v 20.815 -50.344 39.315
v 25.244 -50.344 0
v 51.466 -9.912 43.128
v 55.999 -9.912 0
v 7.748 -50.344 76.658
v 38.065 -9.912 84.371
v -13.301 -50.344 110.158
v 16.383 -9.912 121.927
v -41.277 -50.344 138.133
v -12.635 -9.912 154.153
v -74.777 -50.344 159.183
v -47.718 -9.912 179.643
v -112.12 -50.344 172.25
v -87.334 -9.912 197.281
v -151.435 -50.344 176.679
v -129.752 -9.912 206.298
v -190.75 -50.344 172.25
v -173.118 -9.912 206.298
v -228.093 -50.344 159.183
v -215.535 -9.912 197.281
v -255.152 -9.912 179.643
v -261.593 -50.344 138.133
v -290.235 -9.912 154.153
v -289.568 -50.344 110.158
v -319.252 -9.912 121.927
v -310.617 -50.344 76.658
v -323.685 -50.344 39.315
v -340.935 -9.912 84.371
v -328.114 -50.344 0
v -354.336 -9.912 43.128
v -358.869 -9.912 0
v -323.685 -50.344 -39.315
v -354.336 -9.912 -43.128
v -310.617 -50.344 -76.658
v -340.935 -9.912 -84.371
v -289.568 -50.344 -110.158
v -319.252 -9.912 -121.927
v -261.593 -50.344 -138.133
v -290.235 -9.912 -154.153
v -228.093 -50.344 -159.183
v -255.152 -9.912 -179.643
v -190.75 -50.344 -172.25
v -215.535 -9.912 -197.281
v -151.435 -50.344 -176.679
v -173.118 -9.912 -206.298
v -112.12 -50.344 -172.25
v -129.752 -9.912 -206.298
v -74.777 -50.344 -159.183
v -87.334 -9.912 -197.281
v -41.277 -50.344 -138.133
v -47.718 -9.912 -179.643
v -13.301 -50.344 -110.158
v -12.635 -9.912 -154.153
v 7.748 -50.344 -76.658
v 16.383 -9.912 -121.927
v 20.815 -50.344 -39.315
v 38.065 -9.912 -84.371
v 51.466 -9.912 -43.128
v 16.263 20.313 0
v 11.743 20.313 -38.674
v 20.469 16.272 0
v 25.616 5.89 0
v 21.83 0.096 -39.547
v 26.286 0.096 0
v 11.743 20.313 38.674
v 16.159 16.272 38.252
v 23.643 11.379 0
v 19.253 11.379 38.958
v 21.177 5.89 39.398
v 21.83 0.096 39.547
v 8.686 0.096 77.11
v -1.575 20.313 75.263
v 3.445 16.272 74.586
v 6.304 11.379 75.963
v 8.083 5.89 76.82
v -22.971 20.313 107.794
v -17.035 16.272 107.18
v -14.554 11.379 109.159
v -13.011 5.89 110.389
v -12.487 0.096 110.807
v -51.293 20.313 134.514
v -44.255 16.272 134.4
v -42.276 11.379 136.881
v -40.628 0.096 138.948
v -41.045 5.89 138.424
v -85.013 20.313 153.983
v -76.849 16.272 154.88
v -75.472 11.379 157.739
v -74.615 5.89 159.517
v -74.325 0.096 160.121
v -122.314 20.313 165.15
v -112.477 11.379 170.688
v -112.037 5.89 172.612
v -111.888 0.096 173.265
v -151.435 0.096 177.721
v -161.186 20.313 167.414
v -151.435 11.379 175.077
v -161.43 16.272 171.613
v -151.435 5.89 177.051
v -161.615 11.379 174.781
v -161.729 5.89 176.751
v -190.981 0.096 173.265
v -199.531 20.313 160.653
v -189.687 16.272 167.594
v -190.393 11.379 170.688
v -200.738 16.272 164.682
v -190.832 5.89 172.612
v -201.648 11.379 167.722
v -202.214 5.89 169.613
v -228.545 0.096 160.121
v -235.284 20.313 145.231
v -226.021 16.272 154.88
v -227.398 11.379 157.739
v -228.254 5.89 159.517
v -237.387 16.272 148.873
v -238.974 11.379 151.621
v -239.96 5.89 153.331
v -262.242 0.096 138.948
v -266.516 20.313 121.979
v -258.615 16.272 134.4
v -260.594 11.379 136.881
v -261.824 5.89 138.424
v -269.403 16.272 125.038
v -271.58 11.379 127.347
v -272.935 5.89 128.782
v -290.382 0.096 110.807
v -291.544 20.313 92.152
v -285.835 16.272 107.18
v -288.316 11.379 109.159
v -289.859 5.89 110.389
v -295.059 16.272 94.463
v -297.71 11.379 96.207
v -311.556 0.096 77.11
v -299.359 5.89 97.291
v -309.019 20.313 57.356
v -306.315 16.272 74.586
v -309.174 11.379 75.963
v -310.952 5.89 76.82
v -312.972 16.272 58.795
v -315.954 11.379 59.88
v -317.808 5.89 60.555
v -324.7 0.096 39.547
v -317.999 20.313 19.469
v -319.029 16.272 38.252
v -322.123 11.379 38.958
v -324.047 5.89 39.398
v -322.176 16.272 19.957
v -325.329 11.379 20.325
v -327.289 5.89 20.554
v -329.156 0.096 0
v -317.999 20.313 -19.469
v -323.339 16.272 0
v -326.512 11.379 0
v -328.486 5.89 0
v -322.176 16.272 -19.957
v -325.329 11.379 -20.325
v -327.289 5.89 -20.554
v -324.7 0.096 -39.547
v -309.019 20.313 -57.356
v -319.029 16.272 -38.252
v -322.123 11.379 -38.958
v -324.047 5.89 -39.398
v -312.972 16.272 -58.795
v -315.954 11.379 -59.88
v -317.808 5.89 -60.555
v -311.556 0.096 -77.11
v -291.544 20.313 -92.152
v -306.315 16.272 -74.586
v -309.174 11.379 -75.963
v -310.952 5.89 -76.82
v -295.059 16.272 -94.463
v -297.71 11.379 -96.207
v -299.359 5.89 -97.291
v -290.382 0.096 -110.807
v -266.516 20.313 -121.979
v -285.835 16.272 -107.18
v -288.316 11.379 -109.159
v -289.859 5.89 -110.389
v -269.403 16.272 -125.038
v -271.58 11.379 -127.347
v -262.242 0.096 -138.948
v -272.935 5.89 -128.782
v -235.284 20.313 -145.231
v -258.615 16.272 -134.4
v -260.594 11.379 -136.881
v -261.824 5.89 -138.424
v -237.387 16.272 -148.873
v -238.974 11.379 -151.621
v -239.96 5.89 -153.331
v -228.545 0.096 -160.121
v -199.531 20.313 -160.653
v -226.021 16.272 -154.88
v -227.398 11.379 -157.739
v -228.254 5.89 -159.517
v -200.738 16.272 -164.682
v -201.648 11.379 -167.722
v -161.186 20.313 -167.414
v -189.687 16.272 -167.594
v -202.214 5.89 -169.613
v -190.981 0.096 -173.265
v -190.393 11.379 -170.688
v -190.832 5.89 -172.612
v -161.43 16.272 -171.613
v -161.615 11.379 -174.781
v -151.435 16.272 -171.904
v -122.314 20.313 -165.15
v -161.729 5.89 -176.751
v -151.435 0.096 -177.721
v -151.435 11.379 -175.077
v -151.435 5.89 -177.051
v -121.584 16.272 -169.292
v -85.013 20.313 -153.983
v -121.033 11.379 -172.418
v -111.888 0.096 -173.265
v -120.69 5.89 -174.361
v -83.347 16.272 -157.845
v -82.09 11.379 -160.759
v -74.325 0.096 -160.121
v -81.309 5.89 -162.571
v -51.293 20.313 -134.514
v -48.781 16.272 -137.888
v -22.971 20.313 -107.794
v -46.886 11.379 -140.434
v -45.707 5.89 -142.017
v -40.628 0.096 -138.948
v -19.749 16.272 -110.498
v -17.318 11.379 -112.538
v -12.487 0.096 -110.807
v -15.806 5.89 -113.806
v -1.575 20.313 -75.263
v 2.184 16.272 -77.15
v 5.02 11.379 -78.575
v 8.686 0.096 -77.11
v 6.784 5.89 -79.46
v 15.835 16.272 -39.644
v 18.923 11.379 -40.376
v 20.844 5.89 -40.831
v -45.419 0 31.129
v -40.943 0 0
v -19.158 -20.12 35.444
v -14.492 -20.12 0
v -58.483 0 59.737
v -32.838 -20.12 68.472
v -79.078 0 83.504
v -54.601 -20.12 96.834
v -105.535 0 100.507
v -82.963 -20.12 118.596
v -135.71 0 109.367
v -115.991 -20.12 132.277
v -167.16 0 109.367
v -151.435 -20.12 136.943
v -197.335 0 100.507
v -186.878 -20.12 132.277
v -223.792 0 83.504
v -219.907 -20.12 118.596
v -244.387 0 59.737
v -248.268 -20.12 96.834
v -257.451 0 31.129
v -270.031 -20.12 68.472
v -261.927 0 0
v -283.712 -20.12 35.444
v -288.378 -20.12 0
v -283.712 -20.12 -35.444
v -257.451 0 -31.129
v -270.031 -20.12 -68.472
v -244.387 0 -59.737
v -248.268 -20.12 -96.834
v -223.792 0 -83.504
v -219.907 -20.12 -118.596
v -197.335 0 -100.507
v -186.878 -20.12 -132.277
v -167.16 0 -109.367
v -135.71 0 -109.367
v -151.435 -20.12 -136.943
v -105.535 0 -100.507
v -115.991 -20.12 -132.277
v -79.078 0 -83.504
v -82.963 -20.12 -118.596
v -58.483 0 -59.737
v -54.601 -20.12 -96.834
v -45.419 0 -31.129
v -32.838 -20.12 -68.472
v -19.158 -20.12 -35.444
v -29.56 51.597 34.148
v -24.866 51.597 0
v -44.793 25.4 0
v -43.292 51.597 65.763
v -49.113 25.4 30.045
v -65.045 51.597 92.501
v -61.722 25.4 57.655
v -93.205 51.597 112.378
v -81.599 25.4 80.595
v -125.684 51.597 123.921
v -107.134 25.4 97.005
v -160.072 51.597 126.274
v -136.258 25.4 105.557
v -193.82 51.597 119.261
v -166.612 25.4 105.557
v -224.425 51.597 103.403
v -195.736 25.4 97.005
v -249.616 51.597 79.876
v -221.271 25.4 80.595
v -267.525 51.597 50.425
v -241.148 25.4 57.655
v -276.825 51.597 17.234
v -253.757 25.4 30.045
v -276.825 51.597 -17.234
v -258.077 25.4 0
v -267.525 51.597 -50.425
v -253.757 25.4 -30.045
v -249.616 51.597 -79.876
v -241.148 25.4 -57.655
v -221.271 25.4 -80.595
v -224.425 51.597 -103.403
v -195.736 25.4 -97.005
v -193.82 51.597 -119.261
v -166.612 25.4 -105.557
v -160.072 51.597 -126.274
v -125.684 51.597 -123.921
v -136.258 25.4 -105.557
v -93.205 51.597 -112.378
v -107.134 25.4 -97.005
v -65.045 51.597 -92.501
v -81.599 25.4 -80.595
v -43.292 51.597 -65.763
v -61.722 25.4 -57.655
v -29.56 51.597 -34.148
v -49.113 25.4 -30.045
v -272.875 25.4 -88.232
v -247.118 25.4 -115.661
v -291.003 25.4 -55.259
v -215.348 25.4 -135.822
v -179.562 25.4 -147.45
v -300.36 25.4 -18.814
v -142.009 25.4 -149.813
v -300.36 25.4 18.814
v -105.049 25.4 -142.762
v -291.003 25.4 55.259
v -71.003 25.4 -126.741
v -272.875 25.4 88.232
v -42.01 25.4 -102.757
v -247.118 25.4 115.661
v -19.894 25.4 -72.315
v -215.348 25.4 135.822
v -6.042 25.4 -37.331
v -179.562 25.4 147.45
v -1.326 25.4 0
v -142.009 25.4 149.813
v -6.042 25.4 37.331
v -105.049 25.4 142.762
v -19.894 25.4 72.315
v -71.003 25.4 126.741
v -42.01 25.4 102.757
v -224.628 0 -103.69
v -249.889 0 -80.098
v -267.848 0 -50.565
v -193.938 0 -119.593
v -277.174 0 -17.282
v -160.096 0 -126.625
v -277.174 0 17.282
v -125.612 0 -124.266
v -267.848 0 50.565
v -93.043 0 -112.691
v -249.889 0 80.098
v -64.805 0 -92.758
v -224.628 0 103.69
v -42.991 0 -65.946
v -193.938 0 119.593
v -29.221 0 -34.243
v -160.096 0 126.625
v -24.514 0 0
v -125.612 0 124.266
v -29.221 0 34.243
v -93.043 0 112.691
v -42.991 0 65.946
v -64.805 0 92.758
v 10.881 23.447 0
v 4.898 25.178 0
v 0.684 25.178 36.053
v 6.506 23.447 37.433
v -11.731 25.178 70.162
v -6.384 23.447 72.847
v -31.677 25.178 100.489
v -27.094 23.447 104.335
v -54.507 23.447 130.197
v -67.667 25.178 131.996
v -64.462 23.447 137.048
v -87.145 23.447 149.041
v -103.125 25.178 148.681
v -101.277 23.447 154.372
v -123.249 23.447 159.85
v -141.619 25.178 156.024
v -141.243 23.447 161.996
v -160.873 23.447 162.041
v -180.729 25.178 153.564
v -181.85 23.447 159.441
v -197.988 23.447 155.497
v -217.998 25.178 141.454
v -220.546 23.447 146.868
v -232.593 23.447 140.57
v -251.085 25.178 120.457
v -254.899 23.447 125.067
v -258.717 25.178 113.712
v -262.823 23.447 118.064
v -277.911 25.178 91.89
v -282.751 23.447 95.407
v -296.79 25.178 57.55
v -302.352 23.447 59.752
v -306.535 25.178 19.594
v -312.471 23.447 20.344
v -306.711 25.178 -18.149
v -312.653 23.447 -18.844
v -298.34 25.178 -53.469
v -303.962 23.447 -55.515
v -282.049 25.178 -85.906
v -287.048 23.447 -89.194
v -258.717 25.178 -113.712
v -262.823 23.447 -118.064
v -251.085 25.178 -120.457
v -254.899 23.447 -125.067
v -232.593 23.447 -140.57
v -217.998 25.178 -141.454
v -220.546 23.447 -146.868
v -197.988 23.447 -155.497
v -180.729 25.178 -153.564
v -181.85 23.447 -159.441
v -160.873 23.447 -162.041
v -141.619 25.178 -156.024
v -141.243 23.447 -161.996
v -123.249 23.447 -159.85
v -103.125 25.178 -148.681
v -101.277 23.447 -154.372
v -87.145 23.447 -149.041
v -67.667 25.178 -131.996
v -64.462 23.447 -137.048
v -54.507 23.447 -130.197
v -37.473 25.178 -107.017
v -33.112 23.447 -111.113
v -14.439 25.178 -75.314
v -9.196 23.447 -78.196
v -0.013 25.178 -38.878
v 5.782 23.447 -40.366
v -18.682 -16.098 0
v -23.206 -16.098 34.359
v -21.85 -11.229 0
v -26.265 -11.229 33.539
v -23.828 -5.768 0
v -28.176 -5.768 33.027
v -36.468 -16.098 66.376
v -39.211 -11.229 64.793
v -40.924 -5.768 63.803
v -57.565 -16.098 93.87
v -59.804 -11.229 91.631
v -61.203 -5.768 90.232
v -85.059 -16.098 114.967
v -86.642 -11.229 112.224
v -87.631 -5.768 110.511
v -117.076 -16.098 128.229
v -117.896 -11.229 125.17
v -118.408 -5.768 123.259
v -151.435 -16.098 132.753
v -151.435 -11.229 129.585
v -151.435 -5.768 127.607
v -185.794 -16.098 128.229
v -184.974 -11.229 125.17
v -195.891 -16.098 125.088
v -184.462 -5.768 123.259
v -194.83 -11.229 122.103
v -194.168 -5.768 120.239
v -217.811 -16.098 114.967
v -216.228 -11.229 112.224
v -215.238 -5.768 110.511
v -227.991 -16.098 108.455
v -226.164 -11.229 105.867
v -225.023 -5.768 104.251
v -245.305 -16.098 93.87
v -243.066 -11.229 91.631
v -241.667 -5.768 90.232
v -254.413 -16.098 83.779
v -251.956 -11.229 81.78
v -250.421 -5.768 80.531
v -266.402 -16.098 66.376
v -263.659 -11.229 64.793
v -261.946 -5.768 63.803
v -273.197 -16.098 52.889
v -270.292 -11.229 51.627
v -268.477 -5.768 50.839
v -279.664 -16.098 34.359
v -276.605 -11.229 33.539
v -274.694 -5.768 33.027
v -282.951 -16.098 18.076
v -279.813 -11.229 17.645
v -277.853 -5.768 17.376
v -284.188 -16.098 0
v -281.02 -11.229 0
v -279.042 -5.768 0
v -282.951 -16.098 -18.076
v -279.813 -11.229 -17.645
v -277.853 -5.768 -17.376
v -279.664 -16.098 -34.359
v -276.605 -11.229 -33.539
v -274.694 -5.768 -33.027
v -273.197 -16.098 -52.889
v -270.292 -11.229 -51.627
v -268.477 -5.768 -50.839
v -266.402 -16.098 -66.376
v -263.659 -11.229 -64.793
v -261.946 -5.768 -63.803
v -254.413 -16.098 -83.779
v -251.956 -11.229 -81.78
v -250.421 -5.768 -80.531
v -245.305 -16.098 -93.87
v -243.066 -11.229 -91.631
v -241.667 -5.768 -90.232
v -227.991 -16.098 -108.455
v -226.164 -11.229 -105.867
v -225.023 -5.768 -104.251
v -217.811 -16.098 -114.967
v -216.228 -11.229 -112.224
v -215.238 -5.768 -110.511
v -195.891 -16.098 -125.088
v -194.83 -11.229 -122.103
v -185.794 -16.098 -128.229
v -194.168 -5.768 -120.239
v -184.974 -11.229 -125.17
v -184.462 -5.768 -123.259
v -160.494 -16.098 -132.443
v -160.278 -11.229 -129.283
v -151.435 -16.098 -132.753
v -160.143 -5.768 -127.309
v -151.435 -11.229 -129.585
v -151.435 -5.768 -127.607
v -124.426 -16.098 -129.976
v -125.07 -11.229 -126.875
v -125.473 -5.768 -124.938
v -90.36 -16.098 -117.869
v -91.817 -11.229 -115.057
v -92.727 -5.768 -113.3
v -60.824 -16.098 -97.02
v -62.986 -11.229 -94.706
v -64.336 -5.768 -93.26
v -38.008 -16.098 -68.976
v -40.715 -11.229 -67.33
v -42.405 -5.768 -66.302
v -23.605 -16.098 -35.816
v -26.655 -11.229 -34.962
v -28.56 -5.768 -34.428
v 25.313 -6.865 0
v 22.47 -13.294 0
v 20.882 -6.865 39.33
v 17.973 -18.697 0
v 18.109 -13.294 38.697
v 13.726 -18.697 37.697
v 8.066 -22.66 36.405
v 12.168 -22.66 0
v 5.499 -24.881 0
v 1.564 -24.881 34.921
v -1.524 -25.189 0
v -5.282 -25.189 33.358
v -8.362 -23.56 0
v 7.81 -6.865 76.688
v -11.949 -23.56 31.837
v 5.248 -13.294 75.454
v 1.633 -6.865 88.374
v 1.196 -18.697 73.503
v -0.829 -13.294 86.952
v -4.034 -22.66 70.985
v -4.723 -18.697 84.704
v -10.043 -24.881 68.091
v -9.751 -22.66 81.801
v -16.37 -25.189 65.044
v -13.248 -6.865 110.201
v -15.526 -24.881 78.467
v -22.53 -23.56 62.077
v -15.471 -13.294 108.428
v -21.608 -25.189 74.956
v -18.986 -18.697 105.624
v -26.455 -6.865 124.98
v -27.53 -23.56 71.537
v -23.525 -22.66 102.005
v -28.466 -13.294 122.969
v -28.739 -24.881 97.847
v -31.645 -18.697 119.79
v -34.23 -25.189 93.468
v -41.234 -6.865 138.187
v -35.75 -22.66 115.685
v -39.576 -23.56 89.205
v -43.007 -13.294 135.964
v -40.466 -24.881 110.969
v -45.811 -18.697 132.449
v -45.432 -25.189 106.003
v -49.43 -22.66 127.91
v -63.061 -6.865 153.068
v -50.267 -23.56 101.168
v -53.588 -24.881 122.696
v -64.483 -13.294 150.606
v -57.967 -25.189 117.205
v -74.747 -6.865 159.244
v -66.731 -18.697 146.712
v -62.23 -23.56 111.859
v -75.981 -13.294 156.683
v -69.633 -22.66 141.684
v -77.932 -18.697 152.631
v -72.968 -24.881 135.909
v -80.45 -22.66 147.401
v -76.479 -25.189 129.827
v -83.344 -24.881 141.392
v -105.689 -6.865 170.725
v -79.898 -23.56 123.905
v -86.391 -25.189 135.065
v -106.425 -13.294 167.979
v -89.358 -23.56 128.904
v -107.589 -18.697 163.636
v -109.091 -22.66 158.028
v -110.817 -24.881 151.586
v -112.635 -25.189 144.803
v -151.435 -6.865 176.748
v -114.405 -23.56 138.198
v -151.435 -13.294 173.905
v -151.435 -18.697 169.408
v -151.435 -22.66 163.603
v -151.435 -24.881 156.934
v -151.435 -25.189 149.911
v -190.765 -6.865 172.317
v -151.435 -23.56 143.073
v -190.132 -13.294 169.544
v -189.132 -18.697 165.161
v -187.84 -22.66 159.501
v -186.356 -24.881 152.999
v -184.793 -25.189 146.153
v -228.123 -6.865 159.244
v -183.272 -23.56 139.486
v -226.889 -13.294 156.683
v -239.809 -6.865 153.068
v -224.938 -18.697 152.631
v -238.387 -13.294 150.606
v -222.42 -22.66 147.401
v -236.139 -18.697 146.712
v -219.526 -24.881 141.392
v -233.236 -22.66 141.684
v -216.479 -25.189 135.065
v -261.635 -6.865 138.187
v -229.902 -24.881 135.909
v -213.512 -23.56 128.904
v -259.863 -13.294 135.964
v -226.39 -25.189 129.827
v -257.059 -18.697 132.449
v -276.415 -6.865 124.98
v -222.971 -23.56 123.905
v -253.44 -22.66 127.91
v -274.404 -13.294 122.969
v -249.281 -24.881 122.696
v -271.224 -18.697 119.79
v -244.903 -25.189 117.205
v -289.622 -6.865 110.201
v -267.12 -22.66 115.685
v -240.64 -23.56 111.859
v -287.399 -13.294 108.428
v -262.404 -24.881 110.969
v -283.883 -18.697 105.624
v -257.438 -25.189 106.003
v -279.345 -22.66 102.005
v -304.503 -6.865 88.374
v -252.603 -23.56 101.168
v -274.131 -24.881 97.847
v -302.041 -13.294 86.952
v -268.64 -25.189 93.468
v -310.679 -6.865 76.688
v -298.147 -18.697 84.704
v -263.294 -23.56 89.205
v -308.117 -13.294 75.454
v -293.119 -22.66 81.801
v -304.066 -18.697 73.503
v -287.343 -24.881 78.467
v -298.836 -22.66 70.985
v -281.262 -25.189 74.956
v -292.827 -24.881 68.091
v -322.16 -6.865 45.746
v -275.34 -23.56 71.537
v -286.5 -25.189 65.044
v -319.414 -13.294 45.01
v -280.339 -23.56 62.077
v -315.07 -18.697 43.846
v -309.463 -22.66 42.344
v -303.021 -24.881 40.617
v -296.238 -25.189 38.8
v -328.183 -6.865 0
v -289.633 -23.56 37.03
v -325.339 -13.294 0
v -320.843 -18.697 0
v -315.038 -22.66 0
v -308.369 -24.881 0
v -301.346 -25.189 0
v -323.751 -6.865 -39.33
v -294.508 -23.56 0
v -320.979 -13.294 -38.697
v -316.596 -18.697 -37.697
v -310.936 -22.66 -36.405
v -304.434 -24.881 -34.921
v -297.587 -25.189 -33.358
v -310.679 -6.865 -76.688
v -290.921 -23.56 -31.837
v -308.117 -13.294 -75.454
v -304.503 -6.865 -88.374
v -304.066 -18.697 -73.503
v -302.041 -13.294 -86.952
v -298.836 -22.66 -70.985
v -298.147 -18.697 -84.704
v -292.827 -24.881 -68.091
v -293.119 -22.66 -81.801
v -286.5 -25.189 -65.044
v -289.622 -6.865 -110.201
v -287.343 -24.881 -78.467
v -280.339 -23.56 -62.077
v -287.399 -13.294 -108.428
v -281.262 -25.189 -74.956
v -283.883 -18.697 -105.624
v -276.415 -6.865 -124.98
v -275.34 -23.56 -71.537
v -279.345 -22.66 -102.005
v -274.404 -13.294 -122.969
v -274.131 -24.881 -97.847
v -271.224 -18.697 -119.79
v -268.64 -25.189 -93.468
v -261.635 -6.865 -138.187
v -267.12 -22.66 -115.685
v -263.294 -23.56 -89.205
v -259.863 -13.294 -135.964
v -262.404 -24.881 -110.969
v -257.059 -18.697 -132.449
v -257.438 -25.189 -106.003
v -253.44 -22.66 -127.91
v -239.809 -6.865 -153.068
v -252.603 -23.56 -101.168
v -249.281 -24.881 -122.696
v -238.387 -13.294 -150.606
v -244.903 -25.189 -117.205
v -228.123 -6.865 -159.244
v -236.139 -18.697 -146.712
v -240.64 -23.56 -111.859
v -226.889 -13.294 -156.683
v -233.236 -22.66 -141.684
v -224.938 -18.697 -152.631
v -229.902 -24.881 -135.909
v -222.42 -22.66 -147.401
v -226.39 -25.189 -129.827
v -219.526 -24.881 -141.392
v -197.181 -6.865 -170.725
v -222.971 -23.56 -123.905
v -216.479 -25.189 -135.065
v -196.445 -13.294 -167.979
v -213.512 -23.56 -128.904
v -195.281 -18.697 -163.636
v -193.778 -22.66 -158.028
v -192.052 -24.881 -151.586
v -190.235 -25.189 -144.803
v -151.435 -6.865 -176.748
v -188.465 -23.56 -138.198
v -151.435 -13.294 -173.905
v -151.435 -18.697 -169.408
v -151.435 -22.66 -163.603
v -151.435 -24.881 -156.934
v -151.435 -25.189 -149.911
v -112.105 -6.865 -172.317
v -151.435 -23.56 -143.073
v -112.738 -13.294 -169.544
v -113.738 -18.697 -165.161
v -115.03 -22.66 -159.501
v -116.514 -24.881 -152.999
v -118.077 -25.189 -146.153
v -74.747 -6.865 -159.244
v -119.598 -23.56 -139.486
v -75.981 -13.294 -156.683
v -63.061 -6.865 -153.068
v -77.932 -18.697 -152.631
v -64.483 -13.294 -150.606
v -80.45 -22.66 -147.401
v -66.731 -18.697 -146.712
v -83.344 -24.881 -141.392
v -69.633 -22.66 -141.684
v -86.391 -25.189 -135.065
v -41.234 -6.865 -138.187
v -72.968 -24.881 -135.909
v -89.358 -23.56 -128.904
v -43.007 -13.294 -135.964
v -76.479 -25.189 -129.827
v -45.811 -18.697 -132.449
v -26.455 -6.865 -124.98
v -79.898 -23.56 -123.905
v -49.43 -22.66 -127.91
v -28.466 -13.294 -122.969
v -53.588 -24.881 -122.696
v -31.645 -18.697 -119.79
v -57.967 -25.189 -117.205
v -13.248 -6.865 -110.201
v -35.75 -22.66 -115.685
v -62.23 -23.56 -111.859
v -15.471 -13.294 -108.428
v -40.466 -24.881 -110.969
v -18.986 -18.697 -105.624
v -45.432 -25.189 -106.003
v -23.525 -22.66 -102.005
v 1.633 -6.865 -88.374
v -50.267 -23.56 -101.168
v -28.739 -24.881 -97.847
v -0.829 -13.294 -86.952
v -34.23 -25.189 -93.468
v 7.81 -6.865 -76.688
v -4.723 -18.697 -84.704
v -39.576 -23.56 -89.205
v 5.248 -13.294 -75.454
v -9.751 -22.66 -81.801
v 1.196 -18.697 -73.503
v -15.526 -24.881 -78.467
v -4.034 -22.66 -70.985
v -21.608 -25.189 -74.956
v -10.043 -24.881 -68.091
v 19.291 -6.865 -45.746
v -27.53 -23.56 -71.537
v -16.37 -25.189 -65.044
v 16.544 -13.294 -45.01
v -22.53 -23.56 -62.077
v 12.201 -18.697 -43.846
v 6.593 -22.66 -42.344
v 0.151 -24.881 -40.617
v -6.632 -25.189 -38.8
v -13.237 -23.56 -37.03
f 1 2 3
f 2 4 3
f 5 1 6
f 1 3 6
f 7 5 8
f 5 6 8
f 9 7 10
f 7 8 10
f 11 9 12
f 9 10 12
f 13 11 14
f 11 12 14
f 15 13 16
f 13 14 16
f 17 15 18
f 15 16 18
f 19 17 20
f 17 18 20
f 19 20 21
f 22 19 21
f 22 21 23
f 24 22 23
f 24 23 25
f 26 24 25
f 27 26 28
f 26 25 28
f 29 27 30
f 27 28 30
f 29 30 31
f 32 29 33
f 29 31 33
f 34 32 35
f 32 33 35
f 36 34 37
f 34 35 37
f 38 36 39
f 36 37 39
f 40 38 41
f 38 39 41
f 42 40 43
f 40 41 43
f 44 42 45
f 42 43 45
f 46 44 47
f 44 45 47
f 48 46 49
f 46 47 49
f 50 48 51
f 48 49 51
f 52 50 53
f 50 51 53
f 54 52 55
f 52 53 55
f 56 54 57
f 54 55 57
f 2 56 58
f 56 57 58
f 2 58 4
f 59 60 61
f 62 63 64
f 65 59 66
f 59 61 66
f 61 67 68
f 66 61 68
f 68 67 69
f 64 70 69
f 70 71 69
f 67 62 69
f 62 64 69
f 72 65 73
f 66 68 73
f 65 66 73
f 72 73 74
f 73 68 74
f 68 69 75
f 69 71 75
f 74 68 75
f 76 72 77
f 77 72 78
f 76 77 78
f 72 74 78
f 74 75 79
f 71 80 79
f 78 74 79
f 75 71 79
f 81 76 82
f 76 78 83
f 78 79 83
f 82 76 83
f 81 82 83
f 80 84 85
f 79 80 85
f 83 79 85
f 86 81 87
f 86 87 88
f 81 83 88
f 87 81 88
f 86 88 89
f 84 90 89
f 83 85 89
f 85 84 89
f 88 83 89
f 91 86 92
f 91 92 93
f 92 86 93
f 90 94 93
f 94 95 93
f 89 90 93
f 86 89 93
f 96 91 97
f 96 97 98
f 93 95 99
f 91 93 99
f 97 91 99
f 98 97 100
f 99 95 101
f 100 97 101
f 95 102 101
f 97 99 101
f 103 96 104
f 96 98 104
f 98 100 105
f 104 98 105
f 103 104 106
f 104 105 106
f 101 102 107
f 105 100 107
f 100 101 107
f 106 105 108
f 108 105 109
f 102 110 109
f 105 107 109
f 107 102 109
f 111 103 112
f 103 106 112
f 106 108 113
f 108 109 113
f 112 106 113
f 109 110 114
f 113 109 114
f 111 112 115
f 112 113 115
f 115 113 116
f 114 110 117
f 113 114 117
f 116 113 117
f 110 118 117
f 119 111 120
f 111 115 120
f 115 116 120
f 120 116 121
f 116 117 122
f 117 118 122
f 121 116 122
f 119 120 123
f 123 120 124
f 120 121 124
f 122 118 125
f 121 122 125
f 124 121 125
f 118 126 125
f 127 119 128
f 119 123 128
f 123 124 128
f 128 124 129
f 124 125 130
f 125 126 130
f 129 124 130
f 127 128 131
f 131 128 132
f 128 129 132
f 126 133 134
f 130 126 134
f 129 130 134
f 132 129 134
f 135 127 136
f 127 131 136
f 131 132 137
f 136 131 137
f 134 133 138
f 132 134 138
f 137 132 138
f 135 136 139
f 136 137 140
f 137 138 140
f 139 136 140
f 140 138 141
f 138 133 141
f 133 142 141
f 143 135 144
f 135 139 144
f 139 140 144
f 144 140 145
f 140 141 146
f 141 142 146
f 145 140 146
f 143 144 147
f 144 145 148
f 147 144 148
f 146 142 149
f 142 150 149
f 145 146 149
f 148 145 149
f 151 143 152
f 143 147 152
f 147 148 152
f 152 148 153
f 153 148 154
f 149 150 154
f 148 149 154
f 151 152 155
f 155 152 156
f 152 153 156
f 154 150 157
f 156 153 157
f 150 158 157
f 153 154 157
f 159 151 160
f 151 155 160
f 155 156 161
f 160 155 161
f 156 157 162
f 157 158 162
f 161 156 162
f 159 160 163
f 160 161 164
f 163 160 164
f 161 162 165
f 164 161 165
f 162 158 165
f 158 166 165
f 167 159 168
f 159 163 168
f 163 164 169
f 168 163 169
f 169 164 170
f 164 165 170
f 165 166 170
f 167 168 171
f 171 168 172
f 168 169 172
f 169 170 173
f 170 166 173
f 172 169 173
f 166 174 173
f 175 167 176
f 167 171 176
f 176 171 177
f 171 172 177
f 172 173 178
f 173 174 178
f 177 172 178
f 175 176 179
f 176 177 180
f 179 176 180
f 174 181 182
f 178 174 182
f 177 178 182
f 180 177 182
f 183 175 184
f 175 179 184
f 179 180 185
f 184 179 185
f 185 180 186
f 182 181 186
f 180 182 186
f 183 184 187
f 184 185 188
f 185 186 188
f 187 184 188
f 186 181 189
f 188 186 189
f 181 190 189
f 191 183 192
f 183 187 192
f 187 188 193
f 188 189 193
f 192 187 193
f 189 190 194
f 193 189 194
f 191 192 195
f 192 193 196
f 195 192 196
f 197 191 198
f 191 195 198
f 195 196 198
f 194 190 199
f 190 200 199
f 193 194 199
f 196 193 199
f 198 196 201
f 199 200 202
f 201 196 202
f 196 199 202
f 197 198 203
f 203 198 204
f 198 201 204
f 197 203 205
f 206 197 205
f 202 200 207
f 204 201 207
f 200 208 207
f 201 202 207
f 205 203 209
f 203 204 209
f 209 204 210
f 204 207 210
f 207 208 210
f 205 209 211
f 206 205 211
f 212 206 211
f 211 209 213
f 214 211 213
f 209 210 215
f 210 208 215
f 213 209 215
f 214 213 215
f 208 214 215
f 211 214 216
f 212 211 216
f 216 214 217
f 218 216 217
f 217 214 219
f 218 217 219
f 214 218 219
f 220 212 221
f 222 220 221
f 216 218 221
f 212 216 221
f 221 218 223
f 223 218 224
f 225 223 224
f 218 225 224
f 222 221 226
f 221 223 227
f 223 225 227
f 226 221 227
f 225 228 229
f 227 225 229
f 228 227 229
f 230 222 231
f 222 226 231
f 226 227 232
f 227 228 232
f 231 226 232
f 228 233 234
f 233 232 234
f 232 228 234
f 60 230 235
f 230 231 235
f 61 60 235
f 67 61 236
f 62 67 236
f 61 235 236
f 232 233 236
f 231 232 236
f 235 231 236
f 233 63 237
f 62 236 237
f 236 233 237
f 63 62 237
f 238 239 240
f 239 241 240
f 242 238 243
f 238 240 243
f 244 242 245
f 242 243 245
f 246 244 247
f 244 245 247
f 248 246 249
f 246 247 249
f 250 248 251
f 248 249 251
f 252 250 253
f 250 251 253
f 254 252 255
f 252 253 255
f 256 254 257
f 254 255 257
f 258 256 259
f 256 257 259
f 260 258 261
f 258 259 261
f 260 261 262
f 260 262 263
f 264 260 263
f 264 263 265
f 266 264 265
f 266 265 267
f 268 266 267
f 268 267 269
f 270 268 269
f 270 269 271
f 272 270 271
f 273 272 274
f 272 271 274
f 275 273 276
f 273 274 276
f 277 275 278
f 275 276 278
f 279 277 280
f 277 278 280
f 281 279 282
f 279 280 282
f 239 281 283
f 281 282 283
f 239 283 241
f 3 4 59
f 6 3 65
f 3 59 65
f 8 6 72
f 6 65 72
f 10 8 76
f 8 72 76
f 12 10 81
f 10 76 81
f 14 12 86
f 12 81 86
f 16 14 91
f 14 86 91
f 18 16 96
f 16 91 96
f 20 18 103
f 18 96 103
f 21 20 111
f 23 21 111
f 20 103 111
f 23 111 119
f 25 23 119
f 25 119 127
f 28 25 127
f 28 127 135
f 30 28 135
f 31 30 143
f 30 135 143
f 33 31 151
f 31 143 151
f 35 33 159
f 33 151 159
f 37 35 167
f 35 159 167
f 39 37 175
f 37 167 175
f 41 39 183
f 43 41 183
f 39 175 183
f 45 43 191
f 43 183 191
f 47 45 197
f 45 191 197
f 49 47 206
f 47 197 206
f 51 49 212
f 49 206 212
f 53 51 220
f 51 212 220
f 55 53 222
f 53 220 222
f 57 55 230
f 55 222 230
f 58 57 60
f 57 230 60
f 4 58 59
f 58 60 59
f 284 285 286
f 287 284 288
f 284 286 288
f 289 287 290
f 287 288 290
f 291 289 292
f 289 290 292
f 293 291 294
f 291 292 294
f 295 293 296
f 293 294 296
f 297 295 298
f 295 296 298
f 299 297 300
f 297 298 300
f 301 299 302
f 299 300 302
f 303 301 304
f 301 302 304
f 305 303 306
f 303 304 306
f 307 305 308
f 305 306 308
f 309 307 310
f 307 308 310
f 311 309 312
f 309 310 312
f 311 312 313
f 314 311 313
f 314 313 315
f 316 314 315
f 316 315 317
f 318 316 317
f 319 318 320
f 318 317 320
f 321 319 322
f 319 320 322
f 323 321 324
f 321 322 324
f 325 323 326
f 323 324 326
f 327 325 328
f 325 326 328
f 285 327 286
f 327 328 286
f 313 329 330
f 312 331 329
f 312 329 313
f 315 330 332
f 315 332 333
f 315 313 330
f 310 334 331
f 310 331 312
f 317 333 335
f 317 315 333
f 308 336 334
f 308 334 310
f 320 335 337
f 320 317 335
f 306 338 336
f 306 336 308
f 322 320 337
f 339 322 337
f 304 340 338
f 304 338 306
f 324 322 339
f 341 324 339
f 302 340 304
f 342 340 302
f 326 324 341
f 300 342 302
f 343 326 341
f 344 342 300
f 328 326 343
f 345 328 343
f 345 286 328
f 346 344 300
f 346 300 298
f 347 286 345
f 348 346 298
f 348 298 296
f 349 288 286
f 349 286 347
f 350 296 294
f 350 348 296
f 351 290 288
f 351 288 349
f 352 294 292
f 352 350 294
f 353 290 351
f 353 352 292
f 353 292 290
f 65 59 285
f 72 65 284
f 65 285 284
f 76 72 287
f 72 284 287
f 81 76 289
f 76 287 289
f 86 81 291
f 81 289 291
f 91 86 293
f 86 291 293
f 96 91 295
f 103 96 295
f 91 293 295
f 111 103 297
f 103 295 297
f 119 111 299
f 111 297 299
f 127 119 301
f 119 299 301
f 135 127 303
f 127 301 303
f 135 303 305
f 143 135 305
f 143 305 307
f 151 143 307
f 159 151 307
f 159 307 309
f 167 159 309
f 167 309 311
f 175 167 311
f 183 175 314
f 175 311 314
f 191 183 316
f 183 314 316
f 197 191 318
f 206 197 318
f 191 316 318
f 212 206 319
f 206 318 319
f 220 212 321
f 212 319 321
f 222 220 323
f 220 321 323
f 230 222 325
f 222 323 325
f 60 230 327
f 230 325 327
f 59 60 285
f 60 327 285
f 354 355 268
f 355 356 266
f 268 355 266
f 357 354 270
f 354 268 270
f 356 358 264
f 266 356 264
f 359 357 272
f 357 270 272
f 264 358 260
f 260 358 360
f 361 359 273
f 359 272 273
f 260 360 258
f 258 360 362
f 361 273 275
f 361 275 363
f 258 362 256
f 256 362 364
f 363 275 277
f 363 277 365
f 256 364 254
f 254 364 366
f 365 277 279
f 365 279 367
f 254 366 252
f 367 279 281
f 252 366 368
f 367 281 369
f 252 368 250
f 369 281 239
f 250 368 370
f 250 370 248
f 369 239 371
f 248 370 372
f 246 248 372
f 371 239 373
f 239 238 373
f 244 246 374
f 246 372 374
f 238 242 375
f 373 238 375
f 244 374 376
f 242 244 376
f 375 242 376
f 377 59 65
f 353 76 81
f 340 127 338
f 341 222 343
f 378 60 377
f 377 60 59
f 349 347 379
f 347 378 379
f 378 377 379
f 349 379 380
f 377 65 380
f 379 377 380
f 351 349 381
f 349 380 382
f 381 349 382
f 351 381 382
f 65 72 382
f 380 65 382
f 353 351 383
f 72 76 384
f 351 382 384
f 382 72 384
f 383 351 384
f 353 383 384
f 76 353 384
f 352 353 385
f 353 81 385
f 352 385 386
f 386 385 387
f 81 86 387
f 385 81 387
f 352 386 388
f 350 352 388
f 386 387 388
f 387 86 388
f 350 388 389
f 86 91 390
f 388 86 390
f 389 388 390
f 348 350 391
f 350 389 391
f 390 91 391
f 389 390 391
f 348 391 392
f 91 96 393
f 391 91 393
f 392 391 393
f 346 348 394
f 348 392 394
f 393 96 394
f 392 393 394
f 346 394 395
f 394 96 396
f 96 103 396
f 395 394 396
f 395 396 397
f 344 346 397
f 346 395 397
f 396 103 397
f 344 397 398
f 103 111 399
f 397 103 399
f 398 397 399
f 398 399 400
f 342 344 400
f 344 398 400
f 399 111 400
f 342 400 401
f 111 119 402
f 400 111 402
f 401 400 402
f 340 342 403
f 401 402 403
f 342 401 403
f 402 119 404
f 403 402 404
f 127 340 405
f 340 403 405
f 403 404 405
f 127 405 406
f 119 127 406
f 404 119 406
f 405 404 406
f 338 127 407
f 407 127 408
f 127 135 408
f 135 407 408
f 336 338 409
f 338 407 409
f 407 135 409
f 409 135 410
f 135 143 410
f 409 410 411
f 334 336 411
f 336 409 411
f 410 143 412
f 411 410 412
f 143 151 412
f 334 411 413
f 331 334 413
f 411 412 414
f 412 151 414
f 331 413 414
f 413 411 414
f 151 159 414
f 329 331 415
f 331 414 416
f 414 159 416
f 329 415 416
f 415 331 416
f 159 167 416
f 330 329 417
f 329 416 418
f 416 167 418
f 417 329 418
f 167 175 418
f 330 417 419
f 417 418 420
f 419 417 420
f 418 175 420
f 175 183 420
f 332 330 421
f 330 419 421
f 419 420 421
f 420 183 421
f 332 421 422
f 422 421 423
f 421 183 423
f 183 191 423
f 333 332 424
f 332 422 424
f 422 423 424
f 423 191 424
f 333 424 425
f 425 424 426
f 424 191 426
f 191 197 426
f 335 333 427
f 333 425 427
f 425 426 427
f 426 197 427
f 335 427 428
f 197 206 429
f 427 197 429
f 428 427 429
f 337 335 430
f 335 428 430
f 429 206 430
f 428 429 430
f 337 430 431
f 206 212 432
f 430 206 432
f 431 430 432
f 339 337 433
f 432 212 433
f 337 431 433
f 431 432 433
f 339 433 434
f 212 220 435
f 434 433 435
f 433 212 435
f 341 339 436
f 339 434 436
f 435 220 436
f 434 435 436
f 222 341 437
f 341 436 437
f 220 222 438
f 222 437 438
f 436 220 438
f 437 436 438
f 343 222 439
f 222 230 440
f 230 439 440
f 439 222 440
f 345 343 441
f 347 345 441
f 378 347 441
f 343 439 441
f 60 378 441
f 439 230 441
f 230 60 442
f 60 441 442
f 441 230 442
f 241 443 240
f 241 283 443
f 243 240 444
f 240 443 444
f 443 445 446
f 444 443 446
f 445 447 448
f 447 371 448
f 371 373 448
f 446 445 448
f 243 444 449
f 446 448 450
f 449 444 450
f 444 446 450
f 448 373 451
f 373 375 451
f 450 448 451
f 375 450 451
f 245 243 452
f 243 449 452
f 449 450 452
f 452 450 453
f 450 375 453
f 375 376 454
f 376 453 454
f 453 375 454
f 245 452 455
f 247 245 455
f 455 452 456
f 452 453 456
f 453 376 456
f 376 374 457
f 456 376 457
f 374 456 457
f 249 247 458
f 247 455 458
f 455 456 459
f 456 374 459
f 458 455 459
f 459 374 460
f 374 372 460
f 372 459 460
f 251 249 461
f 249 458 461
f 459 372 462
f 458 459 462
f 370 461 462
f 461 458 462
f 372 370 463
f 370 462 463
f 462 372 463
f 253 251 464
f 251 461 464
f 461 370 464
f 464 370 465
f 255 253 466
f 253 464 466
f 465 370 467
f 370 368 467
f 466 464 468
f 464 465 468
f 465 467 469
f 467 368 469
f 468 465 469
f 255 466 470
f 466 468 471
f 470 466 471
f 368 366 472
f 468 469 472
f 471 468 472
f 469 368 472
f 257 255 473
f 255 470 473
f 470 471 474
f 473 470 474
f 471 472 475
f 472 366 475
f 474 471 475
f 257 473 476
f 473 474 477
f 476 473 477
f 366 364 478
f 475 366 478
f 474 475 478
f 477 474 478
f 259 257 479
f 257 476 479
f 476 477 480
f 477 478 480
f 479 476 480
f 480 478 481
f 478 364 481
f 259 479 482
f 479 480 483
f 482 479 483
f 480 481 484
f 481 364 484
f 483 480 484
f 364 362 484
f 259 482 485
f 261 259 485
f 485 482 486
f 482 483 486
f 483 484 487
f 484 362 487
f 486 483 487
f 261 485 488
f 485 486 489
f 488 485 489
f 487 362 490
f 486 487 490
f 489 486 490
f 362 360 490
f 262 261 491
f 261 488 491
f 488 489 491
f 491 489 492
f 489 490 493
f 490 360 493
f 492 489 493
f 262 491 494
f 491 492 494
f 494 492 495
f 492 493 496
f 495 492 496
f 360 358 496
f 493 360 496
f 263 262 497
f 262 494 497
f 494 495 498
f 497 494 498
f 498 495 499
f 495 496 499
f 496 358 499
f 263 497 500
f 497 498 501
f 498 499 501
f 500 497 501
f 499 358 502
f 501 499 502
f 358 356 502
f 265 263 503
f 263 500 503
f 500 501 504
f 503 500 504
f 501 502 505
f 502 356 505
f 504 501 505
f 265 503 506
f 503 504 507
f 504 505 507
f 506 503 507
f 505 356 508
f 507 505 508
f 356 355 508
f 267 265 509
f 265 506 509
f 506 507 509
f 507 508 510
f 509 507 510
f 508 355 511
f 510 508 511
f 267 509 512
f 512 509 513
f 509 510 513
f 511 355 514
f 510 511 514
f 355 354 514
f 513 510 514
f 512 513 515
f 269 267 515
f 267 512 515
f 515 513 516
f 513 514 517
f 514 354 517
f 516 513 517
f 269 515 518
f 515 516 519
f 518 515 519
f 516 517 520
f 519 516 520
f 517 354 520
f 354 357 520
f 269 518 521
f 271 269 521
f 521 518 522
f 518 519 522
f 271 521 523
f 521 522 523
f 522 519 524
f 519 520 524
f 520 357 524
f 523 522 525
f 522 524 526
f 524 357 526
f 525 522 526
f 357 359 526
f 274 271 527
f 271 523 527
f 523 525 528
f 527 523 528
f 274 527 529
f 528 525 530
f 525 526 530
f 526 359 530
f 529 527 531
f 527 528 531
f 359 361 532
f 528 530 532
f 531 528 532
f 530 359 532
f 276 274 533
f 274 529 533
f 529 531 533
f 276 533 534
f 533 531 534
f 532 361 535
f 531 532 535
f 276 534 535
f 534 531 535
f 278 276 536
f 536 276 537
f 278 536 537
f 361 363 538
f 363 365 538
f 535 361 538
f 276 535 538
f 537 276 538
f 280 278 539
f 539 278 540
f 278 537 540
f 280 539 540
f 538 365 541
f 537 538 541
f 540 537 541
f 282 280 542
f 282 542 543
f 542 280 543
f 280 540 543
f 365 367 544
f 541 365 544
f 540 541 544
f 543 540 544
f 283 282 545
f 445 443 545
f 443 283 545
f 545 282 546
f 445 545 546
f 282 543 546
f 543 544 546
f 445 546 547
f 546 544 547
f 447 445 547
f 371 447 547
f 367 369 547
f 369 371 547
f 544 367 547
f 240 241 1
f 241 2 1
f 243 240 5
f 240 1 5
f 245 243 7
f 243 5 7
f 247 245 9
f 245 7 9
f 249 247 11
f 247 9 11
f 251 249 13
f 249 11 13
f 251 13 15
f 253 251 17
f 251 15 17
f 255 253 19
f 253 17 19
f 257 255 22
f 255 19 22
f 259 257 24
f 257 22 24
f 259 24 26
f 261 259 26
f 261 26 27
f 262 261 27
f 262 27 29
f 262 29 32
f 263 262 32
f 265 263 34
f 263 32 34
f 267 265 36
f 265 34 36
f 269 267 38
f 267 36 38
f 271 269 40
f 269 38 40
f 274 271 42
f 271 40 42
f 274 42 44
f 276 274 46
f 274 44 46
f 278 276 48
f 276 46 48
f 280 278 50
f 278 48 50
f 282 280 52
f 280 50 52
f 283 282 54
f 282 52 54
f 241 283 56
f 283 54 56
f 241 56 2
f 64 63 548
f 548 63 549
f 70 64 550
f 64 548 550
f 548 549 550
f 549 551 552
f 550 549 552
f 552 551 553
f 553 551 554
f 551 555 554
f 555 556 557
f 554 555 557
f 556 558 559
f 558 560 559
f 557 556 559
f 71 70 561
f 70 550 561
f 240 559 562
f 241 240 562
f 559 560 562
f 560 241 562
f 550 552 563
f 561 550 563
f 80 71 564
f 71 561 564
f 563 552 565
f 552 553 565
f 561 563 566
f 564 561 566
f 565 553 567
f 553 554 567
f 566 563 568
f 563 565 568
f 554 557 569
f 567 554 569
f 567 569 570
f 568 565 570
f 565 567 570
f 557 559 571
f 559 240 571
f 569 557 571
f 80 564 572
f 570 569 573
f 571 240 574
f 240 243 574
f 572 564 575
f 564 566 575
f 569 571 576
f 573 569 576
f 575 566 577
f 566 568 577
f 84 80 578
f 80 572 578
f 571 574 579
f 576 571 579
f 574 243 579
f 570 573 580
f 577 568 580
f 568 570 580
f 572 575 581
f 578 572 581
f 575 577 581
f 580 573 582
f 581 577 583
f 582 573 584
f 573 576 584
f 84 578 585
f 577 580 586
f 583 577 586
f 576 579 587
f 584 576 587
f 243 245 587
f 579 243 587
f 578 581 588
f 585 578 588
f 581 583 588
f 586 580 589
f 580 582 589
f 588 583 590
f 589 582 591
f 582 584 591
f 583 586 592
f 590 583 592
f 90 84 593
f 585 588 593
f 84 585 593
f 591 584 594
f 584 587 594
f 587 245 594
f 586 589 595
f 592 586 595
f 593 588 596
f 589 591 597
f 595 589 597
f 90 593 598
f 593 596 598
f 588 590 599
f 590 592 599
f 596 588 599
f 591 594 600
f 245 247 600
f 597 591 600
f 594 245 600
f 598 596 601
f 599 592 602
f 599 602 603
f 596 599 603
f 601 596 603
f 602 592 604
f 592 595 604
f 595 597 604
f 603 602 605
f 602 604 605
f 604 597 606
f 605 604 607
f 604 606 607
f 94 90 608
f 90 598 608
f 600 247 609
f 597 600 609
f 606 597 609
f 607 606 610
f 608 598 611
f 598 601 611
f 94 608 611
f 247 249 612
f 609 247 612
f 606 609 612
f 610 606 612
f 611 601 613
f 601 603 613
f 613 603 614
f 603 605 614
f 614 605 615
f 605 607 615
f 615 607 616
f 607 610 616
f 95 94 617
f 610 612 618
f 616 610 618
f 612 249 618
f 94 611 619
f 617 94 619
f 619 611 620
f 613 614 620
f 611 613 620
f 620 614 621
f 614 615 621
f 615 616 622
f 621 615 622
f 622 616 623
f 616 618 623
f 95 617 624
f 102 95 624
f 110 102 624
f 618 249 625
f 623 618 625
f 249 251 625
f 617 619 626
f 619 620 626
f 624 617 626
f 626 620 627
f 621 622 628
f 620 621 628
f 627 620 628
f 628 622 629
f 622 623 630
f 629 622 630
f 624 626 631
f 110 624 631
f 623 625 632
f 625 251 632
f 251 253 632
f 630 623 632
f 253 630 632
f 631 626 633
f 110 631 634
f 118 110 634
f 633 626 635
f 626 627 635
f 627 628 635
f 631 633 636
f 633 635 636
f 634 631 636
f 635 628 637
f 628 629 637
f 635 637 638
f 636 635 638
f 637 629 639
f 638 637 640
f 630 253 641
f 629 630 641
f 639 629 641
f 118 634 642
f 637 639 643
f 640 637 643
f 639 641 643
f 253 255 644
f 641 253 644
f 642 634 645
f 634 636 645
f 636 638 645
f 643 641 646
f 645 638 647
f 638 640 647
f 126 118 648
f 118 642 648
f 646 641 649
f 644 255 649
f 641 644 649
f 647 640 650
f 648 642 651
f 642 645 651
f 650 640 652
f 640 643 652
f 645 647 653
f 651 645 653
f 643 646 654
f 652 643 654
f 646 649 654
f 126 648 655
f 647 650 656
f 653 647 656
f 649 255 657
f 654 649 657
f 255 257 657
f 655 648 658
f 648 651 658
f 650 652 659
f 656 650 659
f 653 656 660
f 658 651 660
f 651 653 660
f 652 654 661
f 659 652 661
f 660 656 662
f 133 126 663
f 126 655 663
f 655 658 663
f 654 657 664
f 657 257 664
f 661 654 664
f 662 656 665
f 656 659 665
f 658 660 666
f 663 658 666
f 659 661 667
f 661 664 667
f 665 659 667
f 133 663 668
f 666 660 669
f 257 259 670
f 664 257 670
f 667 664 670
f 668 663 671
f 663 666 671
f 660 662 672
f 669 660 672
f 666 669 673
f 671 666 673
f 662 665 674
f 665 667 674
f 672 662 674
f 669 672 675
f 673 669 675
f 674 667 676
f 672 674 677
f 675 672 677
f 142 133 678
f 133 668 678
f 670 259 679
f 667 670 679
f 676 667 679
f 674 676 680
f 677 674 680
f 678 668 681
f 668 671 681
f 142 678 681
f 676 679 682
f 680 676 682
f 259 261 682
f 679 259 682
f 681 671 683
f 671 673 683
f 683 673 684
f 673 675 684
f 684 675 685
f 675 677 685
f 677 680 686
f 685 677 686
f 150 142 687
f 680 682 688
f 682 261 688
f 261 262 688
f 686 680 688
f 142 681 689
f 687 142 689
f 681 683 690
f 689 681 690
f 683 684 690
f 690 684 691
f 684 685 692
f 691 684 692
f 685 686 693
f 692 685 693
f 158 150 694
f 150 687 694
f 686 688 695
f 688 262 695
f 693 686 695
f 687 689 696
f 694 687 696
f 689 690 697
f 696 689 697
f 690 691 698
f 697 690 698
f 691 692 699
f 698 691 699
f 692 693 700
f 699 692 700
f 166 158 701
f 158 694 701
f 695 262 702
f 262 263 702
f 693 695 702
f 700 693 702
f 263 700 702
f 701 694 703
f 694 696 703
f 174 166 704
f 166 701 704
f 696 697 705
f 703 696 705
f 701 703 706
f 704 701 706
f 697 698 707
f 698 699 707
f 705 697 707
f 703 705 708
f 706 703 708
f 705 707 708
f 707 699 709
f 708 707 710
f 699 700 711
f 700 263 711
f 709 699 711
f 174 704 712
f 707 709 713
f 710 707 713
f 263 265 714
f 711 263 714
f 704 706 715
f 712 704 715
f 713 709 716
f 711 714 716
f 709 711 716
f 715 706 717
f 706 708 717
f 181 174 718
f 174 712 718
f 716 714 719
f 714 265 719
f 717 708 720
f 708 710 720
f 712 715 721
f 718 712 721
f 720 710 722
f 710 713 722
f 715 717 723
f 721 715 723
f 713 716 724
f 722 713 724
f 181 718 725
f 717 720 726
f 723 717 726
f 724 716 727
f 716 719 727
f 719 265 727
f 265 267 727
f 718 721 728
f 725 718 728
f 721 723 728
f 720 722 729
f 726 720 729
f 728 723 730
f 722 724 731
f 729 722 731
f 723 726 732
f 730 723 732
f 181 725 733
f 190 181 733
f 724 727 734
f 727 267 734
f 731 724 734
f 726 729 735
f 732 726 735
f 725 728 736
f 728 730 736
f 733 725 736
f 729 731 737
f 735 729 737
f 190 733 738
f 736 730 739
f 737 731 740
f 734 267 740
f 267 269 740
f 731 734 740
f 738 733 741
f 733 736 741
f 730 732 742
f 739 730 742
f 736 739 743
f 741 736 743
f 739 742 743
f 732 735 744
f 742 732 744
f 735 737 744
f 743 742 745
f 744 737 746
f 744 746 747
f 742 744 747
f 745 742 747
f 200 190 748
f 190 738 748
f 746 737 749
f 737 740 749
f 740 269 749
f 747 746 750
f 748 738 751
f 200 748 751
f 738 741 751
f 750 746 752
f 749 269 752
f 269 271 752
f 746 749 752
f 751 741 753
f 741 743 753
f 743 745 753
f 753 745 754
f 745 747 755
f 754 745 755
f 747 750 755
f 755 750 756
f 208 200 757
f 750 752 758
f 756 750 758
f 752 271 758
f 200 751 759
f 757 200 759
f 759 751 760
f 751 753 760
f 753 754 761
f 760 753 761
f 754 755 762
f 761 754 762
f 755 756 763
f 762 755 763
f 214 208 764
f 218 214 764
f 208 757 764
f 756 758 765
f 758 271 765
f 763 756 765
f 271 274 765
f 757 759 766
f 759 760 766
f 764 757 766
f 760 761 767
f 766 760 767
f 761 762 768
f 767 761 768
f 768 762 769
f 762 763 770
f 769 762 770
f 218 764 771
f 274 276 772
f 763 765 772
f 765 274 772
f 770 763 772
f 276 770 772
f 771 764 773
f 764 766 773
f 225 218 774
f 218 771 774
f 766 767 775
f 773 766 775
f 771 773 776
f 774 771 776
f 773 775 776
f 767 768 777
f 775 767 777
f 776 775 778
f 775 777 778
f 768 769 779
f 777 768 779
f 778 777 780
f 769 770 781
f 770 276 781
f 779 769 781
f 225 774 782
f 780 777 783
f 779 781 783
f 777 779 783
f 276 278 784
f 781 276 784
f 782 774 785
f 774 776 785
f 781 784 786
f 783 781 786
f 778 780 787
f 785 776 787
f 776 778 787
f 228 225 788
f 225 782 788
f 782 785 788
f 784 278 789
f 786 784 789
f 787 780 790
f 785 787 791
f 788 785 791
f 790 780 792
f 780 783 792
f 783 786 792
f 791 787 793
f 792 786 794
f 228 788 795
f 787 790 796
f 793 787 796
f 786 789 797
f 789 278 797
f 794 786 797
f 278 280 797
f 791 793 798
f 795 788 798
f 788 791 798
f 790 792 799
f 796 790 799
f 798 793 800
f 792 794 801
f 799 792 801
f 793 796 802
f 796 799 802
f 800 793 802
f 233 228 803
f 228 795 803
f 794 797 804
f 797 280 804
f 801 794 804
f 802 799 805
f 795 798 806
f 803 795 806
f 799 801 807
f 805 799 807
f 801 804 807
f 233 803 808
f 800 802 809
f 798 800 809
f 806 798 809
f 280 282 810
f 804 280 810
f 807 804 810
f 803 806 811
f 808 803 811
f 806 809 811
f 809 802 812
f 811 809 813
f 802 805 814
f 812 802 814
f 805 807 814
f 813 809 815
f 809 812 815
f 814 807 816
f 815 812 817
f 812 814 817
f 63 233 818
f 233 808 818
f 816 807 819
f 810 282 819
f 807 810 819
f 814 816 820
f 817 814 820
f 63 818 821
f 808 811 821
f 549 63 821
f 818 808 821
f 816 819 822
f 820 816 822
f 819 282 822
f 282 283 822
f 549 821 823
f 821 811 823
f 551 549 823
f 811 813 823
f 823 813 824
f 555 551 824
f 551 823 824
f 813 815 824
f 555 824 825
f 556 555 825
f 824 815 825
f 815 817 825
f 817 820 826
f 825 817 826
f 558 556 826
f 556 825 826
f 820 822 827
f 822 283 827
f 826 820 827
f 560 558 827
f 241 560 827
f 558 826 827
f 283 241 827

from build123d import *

# Parameters (mm, degrees)
F1_R     = 151.4348983765
F3_DEPTH = 25.4


# Not quite as in the source:
# - a feature of the source that left no trace in its solid (it failed there, or was rolled back) is left out


with BuildPart() as f2:
    # F0 (on Top) → F2 (revolve)
    with BuildSketch(Plane.XY):
        with BuildLine():
            Line((-14.491534441, -20.1198276415), (25.2444504306, -50.344484377))
            Line((25.2444504306, -50.344484377), (55.999001405, -9.9118540599))
            Line((55.999001405, -9.9118540599), (16.2630163267, 20.3128028329))
            ThreePointArc((16.2630163267, 20.3128028329), (23.6425286685, 11.3787127289), (26.2857406446, 0.0964878225))
            ThreePointArc((26.2857406446, 0.0964878225), (12.1679658867, -22.6603000349), (-14.491534441, -20.1198276415))
        make_face()
    revolve(axis=Axis((-151.4348983765, 0, 0), (0, -1, 0)))


with BuildPart() as f2b:
    # F0 (on Top) → F2, piece 2 (revolve)
    with BuildSketch(Plane.XY):
        with BuildLine():
            Line((-55.6208102037, 11.1646175717), (-14.491534441, -20.1198276415))
            ThreePointArc((-14.491534441, -20.1198276415), (-19.3305745926, 15.4737632063), (16.2630163267, 20.3128028329))
            Line((16.2630163267, 20.3128028329), (-24.8662592294, 51.5972478889))
            Line((-24.8662592294, 51.5972478889), (-55.6208102037, 11.1646175717))
        make_face()
    revolve(axis=Axis((-151.4348983765, 0, 0), (0, -1, 0)))

    # F1 (on Front) → F3 (cut)
    with BuildSketch(Plane.XZ):
        with Locations((-151.4348983765, 0)):
            Circle(F1_R)
    extrude(amount=-F3_DEPTH, mode=Mode.SUBTRACT)


solid = Compound([f2.part, f2b.part])
